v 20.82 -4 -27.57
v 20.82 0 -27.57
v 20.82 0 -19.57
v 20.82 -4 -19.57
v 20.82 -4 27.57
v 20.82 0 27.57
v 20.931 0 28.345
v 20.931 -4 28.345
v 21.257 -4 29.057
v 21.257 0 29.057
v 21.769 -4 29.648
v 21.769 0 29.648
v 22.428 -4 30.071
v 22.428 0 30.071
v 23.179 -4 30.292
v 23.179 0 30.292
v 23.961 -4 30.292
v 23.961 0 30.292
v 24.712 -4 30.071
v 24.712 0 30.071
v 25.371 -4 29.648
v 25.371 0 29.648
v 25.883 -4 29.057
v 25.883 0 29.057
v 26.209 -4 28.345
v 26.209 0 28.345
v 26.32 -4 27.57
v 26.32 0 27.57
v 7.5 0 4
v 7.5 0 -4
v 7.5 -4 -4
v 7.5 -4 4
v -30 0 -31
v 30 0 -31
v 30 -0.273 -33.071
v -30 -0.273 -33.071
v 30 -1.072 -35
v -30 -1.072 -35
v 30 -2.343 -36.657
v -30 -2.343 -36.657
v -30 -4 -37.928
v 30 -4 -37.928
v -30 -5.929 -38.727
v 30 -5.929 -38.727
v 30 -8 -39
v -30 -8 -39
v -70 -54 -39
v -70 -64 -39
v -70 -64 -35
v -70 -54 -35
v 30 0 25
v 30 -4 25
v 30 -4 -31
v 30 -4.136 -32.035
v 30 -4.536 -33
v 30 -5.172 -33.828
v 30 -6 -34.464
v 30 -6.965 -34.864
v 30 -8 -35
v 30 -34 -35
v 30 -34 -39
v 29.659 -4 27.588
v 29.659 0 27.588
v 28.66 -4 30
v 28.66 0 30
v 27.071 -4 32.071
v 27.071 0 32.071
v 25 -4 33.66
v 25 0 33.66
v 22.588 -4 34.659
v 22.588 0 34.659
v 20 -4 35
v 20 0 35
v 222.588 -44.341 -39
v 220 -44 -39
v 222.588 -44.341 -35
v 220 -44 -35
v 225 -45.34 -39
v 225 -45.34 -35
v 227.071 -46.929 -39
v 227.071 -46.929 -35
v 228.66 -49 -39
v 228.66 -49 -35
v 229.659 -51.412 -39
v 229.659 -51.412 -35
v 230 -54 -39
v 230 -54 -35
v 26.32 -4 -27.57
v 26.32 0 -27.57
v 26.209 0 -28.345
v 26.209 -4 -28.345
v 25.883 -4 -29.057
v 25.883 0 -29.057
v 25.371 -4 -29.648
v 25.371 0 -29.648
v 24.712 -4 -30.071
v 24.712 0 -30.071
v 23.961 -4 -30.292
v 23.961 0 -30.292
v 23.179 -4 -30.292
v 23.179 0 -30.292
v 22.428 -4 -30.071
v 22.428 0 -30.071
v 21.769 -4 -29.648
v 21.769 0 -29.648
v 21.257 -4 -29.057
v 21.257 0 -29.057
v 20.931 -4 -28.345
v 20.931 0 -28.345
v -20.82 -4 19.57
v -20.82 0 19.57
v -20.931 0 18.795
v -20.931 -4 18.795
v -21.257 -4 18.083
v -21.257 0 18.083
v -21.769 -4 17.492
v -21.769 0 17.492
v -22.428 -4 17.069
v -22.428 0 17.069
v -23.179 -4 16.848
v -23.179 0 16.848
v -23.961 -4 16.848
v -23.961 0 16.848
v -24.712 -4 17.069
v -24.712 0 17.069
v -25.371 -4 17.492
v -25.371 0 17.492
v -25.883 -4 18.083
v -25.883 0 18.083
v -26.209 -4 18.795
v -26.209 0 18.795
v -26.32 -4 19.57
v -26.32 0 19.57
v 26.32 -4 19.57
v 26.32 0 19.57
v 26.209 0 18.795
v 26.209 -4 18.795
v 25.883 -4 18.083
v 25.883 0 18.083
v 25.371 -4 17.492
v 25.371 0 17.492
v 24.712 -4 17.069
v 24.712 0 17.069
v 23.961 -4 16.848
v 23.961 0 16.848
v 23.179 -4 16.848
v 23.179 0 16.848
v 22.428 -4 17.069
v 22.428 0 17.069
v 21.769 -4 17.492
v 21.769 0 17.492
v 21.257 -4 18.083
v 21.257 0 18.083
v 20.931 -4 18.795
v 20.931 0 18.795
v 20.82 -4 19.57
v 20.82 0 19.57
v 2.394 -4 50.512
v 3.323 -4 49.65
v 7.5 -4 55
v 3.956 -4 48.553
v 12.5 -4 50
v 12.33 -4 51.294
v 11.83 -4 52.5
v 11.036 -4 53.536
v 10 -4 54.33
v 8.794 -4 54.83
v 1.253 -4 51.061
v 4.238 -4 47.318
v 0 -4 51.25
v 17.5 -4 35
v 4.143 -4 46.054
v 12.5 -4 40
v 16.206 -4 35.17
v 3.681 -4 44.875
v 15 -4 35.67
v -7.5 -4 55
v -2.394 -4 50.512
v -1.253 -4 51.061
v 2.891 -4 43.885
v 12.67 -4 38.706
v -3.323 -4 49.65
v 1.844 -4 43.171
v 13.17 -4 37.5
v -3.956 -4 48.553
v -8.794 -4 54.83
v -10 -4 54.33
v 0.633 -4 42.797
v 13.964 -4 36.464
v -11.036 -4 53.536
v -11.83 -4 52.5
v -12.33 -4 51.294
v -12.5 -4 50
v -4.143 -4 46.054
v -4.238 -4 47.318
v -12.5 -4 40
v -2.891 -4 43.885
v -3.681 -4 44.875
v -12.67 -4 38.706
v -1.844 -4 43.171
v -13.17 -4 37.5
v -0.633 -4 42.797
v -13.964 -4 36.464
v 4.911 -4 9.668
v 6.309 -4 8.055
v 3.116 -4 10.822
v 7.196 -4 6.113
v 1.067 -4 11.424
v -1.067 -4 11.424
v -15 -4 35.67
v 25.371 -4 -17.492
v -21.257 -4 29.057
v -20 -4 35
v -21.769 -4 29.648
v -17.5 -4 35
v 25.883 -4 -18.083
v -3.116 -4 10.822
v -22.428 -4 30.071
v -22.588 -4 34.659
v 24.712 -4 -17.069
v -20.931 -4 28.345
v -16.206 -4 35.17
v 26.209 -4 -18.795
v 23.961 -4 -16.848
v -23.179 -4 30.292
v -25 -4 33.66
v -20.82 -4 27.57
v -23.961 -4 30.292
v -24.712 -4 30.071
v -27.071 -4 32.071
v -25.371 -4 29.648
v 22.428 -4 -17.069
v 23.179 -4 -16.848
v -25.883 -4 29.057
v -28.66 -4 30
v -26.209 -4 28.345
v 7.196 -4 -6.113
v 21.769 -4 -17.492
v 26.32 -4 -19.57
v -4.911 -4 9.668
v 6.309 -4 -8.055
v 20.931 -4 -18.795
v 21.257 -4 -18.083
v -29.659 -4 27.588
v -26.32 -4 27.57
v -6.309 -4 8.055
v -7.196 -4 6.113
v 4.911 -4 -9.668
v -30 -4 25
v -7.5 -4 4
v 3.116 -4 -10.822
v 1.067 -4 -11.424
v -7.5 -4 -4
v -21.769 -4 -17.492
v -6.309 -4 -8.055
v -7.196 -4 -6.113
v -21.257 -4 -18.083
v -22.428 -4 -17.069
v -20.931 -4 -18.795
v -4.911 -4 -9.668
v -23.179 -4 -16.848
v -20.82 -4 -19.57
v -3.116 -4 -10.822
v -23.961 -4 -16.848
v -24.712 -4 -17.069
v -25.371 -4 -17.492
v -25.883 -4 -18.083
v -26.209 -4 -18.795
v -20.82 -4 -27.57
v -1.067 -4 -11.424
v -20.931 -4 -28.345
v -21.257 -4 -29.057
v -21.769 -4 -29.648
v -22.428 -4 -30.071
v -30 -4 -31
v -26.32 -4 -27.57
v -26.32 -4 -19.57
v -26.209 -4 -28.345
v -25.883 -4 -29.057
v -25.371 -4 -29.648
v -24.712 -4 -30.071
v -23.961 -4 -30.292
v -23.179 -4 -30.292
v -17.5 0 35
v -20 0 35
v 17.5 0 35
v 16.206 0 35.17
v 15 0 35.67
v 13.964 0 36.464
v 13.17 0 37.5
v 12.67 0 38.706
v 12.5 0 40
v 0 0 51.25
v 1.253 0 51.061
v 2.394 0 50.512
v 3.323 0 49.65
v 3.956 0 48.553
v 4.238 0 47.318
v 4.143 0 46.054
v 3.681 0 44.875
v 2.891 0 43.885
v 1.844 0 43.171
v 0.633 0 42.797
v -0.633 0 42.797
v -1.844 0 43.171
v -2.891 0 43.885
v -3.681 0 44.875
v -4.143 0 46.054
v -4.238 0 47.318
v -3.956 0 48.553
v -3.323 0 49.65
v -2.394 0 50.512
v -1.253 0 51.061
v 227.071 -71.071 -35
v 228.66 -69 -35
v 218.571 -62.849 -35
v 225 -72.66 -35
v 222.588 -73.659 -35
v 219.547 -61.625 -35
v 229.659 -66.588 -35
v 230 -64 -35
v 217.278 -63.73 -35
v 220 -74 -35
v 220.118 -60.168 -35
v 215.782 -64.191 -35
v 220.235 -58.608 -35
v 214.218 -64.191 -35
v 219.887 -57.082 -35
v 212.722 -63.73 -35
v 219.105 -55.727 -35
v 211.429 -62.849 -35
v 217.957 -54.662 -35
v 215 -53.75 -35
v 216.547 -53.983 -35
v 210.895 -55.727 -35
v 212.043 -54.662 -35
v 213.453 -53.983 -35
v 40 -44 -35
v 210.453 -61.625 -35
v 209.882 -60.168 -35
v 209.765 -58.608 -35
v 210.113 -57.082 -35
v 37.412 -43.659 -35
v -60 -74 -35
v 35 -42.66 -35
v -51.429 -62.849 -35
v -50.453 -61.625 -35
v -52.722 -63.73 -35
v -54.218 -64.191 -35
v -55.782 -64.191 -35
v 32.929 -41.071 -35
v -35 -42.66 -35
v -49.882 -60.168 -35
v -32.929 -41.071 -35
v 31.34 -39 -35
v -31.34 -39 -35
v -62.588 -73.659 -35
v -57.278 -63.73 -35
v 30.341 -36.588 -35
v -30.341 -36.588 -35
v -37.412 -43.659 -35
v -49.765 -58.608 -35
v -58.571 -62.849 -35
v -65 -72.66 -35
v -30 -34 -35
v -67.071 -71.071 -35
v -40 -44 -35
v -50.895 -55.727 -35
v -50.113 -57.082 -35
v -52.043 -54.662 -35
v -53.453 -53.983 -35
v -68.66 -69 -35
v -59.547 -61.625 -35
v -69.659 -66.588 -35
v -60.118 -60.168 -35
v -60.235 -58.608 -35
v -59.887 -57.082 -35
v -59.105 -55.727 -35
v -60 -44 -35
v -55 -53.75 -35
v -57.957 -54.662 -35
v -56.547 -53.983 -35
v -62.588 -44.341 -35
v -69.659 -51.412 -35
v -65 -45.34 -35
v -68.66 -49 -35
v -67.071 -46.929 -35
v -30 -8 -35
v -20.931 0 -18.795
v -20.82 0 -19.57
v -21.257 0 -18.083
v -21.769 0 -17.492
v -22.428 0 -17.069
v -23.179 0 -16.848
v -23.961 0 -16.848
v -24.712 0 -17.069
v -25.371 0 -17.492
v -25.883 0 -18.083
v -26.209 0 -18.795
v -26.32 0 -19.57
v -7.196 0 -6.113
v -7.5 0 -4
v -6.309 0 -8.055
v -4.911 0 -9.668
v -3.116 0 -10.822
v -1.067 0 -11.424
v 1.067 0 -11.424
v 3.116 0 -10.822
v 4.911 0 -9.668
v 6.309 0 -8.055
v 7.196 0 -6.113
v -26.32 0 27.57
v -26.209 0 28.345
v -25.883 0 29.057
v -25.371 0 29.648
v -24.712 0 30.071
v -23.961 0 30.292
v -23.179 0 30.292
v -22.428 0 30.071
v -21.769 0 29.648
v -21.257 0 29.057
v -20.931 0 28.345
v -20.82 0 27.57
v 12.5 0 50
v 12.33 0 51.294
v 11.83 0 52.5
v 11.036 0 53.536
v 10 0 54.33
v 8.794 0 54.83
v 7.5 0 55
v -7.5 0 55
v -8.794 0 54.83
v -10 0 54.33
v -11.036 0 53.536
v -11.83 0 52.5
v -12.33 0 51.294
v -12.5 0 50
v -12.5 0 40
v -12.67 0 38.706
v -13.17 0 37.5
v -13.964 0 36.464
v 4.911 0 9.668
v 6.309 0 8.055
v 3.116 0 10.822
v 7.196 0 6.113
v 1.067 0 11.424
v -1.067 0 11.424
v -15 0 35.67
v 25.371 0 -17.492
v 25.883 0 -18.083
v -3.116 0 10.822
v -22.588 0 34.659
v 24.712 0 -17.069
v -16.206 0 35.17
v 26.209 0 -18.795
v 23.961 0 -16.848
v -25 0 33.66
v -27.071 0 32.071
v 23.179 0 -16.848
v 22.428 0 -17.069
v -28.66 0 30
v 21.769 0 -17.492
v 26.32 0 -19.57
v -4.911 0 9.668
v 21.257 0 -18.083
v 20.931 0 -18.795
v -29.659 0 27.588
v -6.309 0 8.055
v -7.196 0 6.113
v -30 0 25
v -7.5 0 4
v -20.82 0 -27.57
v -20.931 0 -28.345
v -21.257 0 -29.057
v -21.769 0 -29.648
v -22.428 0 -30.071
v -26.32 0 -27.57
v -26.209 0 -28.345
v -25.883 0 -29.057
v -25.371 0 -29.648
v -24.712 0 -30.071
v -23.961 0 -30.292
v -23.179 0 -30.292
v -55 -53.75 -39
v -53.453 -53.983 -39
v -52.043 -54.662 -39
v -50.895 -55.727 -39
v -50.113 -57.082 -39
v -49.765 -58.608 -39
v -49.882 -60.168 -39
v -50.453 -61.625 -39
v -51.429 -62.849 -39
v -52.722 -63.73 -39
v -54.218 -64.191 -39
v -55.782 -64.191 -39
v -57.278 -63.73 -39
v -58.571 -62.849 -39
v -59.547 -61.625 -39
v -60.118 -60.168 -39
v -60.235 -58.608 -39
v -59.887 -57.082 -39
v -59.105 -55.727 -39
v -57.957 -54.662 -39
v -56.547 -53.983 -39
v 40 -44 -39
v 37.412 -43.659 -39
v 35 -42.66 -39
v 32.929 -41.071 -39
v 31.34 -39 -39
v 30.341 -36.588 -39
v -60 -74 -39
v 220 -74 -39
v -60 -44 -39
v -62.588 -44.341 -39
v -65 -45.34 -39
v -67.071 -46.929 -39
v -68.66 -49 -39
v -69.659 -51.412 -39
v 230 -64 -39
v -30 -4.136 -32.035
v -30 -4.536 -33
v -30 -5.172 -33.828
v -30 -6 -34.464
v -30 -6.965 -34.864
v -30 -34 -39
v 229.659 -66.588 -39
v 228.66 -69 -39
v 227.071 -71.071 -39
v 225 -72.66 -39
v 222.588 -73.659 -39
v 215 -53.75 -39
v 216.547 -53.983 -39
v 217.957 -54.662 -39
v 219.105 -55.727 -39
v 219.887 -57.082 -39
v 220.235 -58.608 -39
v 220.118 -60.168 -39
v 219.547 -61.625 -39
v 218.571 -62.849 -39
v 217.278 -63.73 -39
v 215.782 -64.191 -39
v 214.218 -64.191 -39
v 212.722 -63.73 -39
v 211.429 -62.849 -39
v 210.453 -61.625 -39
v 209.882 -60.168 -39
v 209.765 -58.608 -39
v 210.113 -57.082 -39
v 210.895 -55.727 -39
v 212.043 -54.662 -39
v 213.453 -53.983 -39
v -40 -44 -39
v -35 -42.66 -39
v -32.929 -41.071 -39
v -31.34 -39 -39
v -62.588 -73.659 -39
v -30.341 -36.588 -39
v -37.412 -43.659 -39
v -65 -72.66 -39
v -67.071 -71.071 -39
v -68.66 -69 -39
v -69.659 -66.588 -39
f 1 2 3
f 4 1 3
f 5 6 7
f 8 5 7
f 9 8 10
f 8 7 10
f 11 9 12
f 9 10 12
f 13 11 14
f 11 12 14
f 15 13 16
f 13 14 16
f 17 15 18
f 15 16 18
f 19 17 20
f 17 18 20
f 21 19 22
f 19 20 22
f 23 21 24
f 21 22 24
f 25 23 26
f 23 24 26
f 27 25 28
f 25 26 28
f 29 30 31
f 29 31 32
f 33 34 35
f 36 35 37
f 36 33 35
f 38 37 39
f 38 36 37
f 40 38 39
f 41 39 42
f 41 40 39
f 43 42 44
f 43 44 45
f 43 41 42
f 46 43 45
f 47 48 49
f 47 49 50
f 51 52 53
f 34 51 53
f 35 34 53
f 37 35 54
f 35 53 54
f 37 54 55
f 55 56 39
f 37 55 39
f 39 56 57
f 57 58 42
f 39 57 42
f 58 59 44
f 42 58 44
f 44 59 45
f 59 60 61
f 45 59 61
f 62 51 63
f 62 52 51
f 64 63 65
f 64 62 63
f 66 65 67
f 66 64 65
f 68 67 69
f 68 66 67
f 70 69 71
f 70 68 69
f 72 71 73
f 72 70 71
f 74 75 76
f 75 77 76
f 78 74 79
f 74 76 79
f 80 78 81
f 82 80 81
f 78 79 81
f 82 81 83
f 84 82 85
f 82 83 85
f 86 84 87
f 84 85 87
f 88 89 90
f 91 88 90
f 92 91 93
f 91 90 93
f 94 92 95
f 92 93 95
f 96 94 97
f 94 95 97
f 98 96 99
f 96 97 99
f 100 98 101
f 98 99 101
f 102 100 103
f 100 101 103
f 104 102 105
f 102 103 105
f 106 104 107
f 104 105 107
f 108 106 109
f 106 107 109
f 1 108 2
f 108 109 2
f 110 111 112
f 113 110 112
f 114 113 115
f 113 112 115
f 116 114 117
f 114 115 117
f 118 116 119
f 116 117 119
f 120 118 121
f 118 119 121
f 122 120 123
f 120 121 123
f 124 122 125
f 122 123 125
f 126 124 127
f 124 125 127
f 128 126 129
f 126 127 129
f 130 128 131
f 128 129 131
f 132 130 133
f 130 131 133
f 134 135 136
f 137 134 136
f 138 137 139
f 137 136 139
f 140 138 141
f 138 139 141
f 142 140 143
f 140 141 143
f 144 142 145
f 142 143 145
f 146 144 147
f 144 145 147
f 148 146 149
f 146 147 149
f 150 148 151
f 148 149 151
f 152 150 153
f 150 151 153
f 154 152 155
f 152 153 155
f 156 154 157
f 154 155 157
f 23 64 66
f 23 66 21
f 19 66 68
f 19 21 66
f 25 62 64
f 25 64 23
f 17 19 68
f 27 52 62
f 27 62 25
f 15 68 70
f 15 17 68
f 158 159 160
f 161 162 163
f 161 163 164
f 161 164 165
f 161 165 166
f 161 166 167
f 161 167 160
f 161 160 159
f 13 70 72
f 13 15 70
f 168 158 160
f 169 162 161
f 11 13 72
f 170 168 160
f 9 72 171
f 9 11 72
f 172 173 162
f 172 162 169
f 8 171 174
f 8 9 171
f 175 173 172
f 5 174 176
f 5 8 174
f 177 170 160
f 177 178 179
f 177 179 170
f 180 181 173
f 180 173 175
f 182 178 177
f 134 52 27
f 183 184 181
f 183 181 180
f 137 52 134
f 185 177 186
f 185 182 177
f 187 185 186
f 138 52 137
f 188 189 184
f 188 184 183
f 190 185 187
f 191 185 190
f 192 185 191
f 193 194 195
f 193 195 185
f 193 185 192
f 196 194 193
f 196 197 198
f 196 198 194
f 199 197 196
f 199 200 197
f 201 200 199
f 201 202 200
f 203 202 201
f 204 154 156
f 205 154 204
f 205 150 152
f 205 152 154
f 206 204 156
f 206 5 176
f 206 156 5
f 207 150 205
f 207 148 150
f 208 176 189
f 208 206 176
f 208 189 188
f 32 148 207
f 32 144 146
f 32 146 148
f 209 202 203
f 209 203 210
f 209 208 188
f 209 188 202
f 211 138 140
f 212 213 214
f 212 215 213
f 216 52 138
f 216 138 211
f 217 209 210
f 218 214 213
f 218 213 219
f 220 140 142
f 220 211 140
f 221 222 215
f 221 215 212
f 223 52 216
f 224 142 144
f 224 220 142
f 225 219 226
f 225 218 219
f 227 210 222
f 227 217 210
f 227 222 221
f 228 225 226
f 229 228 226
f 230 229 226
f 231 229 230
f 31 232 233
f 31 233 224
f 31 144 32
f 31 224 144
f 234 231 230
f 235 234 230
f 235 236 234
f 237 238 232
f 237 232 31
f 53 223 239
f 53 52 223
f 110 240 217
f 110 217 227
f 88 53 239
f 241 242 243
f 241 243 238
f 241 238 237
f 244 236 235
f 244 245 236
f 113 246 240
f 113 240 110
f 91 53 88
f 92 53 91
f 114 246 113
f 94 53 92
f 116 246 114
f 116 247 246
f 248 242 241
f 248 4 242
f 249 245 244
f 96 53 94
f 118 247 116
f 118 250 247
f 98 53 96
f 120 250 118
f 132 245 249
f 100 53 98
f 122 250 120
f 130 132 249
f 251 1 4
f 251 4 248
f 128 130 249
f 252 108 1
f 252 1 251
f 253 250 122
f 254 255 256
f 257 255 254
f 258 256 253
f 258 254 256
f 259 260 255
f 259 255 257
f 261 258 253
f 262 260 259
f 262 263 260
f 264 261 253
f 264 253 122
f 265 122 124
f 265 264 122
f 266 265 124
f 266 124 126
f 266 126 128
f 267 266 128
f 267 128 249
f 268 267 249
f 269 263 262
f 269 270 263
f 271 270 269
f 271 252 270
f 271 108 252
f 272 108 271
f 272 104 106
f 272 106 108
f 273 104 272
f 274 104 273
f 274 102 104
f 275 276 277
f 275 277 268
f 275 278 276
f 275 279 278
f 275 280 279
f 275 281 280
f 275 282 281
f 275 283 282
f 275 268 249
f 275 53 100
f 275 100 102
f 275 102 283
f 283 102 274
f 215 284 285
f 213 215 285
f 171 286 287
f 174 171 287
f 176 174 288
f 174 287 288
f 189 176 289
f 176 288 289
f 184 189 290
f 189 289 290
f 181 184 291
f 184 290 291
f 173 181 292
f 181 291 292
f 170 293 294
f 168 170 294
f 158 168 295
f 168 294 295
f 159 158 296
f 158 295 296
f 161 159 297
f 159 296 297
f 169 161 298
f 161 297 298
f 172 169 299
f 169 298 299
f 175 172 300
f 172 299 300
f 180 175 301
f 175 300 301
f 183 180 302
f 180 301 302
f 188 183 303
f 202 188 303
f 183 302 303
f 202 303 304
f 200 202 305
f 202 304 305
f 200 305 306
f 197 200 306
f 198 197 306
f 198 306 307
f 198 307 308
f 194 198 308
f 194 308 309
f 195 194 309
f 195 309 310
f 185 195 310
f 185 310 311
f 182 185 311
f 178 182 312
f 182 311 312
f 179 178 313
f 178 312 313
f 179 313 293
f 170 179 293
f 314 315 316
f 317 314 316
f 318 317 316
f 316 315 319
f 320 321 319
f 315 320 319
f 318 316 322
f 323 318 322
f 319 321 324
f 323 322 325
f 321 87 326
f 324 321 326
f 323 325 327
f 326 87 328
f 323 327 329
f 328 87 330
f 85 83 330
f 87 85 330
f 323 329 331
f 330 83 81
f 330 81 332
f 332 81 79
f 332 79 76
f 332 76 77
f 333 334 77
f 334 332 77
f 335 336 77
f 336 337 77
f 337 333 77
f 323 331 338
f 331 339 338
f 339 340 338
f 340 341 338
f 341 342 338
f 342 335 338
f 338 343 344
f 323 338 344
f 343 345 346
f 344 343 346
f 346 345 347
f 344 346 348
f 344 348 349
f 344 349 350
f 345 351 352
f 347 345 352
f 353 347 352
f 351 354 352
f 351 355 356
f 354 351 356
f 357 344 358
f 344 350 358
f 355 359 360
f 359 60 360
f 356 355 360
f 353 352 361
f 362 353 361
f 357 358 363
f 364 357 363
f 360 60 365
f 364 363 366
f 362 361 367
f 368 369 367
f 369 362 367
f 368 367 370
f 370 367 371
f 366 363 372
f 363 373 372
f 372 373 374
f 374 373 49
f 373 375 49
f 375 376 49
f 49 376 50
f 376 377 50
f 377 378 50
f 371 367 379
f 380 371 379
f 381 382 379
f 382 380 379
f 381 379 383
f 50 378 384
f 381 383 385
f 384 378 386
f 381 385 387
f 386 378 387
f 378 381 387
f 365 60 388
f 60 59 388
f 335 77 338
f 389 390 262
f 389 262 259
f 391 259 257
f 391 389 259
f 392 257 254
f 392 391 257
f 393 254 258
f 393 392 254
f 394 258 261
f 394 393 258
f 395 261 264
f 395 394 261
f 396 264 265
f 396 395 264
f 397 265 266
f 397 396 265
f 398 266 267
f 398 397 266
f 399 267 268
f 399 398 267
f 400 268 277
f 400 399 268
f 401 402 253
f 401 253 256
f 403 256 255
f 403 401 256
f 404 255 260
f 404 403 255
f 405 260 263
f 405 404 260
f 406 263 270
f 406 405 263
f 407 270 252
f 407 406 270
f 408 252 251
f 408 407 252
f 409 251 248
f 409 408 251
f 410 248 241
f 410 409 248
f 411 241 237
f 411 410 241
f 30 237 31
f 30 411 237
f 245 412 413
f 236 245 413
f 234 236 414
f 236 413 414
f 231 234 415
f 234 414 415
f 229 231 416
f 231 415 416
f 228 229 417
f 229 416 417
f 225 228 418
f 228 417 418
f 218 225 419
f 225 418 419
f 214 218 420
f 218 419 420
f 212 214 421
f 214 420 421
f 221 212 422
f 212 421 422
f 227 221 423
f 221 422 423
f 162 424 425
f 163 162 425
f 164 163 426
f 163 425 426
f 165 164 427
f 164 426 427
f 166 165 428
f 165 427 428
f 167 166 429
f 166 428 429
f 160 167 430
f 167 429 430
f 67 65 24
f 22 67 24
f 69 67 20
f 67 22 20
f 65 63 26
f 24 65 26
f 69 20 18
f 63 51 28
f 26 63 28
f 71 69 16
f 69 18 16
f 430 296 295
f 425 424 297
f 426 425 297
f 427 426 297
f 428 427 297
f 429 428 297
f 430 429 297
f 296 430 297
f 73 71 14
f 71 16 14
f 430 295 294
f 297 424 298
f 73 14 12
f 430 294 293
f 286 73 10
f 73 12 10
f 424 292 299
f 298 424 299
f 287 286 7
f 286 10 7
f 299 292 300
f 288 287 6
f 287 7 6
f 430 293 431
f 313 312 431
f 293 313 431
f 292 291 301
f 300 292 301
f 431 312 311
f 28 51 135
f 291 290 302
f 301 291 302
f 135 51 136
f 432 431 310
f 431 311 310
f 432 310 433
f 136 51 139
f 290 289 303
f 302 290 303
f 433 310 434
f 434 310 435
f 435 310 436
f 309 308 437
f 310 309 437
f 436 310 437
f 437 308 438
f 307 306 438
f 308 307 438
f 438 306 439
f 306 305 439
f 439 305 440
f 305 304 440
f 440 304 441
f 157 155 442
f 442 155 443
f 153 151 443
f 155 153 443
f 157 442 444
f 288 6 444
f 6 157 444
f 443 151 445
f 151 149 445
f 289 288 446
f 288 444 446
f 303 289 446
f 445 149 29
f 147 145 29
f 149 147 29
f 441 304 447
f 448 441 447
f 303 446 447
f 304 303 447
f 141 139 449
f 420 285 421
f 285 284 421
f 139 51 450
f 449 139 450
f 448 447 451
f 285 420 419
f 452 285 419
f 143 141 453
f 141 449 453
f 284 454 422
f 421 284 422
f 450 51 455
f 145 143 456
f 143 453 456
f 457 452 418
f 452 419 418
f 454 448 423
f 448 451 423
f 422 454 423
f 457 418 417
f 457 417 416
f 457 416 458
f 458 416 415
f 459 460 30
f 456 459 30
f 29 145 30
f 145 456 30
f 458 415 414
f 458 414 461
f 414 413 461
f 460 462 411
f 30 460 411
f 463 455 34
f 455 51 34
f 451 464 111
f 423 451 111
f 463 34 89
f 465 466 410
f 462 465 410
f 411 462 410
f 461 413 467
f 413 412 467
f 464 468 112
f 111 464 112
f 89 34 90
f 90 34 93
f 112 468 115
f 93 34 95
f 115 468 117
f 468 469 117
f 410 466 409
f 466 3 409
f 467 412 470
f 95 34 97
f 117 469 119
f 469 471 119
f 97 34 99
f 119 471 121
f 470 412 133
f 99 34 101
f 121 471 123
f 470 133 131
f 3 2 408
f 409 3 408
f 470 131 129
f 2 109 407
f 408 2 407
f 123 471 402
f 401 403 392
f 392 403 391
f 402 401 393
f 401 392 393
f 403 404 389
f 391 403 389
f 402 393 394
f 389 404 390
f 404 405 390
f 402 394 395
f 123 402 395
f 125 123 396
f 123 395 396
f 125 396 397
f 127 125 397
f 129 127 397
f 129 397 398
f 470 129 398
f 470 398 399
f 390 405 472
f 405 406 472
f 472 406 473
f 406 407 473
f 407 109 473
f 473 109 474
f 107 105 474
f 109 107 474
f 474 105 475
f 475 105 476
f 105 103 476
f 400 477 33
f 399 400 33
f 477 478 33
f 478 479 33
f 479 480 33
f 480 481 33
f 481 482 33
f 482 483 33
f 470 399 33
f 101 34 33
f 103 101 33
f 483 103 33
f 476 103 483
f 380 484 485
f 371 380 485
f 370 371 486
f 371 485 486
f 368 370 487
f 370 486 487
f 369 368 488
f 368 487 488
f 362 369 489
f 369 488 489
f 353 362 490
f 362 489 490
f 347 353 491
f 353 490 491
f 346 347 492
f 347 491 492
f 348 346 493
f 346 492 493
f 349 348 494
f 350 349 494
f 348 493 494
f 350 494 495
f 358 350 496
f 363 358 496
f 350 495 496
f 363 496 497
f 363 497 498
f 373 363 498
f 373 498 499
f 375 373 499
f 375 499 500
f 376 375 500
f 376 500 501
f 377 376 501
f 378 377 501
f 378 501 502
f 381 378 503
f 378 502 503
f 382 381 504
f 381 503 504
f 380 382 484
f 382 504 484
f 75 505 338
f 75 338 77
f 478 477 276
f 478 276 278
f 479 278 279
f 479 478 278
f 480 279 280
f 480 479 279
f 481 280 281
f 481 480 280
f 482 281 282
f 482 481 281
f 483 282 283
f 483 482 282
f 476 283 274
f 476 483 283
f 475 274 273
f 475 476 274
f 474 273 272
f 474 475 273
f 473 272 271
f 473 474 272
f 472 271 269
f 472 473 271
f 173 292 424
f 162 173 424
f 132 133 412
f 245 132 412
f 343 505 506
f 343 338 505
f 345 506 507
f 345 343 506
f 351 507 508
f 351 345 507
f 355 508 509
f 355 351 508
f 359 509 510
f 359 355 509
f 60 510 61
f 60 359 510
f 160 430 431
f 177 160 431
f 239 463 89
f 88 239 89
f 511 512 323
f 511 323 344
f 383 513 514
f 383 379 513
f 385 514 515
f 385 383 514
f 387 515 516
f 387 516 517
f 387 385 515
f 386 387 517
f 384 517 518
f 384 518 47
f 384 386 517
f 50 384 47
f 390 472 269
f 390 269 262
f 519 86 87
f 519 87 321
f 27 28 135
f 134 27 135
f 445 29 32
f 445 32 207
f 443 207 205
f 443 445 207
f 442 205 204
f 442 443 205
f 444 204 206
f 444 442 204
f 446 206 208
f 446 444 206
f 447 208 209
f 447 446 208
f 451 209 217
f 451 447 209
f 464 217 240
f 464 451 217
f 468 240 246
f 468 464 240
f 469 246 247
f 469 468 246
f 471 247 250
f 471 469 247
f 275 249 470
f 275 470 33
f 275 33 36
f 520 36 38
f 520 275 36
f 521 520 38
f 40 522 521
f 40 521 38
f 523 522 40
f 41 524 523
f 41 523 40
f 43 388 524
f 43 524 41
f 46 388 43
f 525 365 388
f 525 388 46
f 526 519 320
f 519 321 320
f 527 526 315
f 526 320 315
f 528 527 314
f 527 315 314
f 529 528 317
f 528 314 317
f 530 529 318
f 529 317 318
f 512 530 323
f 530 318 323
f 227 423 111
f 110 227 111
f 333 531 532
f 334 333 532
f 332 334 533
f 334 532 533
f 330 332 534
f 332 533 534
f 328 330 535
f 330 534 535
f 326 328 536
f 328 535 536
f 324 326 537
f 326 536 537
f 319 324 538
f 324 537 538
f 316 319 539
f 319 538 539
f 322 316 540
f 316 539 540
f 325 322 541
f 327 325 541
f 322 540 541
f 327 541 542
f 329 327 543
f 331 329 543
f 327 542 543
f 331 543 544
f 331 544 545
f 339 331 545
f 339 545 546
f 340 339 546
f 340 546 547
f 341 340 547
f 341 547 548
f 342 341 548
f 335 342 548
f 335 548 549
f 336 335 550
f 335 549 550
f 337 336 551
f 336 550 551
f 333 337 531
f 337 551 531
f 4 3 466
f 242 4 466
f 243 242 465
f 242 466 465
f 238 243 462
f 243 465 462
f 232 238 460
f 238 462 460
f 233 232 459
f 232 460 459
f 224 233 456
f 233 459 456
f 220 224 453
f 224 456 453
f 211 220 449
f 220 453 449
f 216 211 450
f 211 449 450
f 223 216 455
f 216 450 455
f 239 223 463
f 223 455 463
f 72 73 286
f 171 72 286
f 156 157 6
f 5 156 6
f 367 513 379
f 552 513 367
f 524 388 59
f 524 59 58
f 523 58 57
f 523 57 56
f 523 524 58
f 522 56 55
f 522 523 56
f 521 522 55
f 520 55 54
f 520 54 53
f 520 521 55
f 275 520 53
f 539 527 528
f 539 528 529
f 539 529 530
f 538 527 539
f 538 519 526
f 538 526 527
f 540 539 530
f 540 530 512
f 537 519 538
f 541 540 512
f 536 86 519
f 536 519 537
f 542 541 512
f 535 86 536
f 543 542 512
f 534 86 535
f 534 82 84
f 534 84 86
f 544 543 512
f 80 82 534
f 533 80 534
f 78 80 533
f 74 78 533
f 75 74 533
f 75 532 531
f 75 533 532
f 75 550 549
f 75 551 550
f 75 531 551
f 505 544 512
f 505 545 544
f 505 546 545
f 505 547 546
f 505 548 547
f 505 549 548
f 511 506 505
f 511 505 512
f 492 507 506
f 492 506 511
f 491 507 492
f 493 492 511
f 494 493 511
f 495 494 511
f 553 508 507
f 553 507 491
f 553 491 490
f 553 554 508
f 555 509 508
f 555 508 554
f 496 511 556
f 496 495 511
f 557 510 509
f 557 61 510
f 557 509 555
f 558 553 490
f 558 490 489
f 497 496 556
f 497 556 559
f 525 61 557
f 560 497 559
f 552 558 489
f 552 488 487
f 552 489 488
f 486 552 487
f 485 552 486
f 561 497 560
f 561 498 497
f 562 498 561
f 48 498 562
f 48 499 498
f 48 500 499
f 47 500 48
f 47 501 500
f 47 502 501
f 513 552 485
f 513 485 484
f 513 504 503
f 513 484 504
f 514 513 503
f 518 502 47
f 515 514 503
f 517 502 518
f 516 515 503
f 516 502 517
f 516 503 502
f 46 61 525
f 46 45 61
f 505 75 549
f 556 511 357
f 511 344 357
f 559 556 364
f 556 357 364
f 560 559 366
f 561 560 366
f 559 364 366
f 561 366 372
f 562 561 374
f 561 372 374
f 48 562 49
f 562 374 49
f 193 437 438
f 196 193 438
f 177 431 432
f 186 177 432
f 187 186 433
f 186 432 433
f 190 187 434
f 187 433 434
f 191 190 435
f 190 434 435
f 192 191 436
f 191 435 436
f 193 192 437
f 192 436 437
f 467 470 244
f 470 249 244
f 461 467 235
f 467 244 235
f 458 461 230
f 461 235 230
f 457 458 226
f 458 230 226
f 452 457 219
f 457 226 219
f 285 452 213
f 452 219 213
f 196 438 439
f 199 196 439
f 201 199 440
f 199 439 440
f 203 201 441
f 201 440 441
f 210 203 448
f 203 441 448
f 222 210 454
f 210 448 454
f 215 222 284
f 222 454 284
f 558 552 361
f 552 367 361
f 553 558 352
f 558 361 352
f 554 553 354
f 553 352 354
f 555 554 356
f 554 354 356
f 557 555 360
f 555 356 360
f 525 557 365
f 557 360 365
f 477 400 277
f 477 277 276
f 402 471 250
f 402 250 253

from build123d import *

# Parameters (mm, degrees)
SKETCH1_R                    = 4.25
BASE_FLANGE1_DEPTH           = 4
EDGE_FLANGE1_STRIP_W         = 24
EDGE_FLANGE1_STRIP_H         = 4
EDGE_FLANGE1_STRIP_CUT_DEPTH = 60
EDGE_FLANGE1_DEPTH           = 60
SKETCH11_R                   = 5.25
TAB1_DEPTH                   = 4
FILLET2_R                    = 10


# Sheet-metal steps are written as plain solids
with BuildPart() as part:
    # Sketch1 → Base-Flange1 (new body)
    with BuildSketch(Plane(origin=(0, 0, 0), x_dir=(1, 0, 0), z_dir=(0, 1, 0))):
        with BuildLine():
            Line((30, -35), (17.5, -35))
            ThreePointArc((17.5, -35), (13.964466094, -36.464466094), (12.5, -40))
            Line((12.5, -40), (12.5, -50))
            ThreePointArc((12.5, -50), (11.035533906, -53.535533906), (7.5, -55))
            Line((7.5, -55), (-7.5, -55))
            ThreePointArc((-7.5, -55), (-11.035533906, -53.535533906), (-12.5, -50))
            Line((-12.5, -50), (-12.5, -40))
            ThreePointArc((-12.5, -40), (-13.964466094, -36.464466094), (-17.5, -35))
            Line((-17.5, -35), (-30, -35))
            Line((-30, -35), (-30, 35))
            Line((-30, 35), (30, 35))
            Line((30, 35), (30, -35))
        make_face()
        with Locations(Location((0, -47, 0), (0, 0, 270))):
            Circle(SKETCH1_R, mode=Mode.SUBTRACT)
        with BuildLine():
            Line((-26.32, 19.57), (-26.32, 27.57))
            ThreePointArc((-26.32, 27.57), (-23.57, 30.32), (-20.82, 27.57))
            Line((-20.82, 27.57), (-20.82, 19.57))
            ThreePointArc((-20.82, 19.57), (-23.57, 16.82), (-26.32, 19.57))
        make_face(mode=Mode.SUBTRACT)
        with BuildLine():
            Line((26.32, 19.57), (26.32, 27.57))
            ThreePointArc((26.32, 27.57), (23.57, 30.32), (20.82, 27.57))
            Line((20.82, 27.57), (20.82, 19.57))
            ThreePointArc((20.82, 19.57), (23.57, 16.82), (26.32, 19.57))
        make_face(mode=Mode.SUBTRACT)
        with BuildLine():
            Line((26.32, -27.57), (26.32, -19.57))
            ThreePointArc((26.32, -19.57), (23.57, -16.82), (20.82, -19.57))
            Line((20.82, -19.57), (20.82, -27.57))
            ThreePointArc((20.82, -27.57), (23.57, -30.32), (26.32, -27.57))
        make_face(mode=Mode.SUBTRACT)
        with BuildLine():
            Line((-20.82, -27.57), (-20.82, -19.57))
            ThreePointArc((-20.82, -19.57), (-23.57, -16.82), (-26.32, -19.57))
            Line((-26.32, -19.57), (-26.32, -27.57))
            ThreePointArc((-26.32, -27.57), (-23.57, -30.32), (-20.82, -27.57))
        make_face(mode=Mode.SUBTRACT)
        with BuildLine():
            Line((7.5, 4), (7.5, -4))
            ThreePointArc((7.5, -4), (0, -11.5), (-7.5, -4))
            Line((-7.5, -4), (-7.5, 4))
            ThreePointArc((-7.5, 4), (0, 11.5), (7.5, 4))
        make_face(mode=Mode.SUBTRACT)
    extrude(amount=-BASE_FLANGE1_DEPTH)

    # Edge-Flange1 strip (across the edge) → Edge-Flange1 strip cut (cut)
    with BuildSketch(Plane(origin=(-30, -4, -35), x_dir=(0, 0, 1), z_dir=(1, 0, 0))):
        with Locations((-8, -2)):
            Rectangle(EDGE_FLANGE1_STRIP_W, EDGE_FLANGE1_STRIP_H)
    extrude(amount=EDGE_FLANGE1_STRIP_CUT_DEPTH, mode=Mode.SUBTRACT)

    # Edge-Flange1 section (across the edge) → Edge-Flange1 (add)
    with BuildSketch(Plane(origin=(-30, -4, -35), x_dir=(0, 0, 1), z_dir=(1, 0, 0))):
        with BuildLine():
            Line((-4, 4), (-4, 40))
            Line((-4, 40), (0, 40))
            Line((0, 40), (0, 4))
            ThreePointArc((0, 4), (1.171572875, 1.171572875), (4, 0))
            Line((4, 0), (4, -4))
            ThreePointArc((4, -4), (-1.656854249, -1.656854249), (-4, 4))
        make_face()
    extrude(amount=EDGE_FLANGE1_DEPTH)

    # Sketch11 → Tab1 (add)
    with BuildSketch(Plane(origin=(0, 0, -39), x_dir=(-1, 0, 0), z_dir=(0, 0, -1))):
        Polygon((-30, -44), (-230, -44), (-230, -74), (70, -74), (70, -44), (30, -44), (30, -8), (-30, -8), align=None)
        with Locations(Location((-215, -59, 0), (0, 0, 90))):
            Circle(SKETCH11_R, mode=Mode.SUBTRACT)
        with Locations(Location((55, -59, 0), (0, 0, 90))):
            Circle(SKETCH11_R, mode=Mode.SUBTRACT)
    extrude(amount=-TAB1_DEPTH)

    # Fillet2
    fillet2_edges = [part.edges().sort_by_distance(p)[0] for p in [
        (-30, -44, -37),
        (30, -44, -37),
        (-70, -44, -37),
        (-70, -74, -37),
        (230, -74, -37),
        (230, -44, -37),
        (30, -2, 35),
        (-30, -2, 35),
    ]]
    fillet(fillet2_edges, radius=FILLET2_R)


solid = part.part
